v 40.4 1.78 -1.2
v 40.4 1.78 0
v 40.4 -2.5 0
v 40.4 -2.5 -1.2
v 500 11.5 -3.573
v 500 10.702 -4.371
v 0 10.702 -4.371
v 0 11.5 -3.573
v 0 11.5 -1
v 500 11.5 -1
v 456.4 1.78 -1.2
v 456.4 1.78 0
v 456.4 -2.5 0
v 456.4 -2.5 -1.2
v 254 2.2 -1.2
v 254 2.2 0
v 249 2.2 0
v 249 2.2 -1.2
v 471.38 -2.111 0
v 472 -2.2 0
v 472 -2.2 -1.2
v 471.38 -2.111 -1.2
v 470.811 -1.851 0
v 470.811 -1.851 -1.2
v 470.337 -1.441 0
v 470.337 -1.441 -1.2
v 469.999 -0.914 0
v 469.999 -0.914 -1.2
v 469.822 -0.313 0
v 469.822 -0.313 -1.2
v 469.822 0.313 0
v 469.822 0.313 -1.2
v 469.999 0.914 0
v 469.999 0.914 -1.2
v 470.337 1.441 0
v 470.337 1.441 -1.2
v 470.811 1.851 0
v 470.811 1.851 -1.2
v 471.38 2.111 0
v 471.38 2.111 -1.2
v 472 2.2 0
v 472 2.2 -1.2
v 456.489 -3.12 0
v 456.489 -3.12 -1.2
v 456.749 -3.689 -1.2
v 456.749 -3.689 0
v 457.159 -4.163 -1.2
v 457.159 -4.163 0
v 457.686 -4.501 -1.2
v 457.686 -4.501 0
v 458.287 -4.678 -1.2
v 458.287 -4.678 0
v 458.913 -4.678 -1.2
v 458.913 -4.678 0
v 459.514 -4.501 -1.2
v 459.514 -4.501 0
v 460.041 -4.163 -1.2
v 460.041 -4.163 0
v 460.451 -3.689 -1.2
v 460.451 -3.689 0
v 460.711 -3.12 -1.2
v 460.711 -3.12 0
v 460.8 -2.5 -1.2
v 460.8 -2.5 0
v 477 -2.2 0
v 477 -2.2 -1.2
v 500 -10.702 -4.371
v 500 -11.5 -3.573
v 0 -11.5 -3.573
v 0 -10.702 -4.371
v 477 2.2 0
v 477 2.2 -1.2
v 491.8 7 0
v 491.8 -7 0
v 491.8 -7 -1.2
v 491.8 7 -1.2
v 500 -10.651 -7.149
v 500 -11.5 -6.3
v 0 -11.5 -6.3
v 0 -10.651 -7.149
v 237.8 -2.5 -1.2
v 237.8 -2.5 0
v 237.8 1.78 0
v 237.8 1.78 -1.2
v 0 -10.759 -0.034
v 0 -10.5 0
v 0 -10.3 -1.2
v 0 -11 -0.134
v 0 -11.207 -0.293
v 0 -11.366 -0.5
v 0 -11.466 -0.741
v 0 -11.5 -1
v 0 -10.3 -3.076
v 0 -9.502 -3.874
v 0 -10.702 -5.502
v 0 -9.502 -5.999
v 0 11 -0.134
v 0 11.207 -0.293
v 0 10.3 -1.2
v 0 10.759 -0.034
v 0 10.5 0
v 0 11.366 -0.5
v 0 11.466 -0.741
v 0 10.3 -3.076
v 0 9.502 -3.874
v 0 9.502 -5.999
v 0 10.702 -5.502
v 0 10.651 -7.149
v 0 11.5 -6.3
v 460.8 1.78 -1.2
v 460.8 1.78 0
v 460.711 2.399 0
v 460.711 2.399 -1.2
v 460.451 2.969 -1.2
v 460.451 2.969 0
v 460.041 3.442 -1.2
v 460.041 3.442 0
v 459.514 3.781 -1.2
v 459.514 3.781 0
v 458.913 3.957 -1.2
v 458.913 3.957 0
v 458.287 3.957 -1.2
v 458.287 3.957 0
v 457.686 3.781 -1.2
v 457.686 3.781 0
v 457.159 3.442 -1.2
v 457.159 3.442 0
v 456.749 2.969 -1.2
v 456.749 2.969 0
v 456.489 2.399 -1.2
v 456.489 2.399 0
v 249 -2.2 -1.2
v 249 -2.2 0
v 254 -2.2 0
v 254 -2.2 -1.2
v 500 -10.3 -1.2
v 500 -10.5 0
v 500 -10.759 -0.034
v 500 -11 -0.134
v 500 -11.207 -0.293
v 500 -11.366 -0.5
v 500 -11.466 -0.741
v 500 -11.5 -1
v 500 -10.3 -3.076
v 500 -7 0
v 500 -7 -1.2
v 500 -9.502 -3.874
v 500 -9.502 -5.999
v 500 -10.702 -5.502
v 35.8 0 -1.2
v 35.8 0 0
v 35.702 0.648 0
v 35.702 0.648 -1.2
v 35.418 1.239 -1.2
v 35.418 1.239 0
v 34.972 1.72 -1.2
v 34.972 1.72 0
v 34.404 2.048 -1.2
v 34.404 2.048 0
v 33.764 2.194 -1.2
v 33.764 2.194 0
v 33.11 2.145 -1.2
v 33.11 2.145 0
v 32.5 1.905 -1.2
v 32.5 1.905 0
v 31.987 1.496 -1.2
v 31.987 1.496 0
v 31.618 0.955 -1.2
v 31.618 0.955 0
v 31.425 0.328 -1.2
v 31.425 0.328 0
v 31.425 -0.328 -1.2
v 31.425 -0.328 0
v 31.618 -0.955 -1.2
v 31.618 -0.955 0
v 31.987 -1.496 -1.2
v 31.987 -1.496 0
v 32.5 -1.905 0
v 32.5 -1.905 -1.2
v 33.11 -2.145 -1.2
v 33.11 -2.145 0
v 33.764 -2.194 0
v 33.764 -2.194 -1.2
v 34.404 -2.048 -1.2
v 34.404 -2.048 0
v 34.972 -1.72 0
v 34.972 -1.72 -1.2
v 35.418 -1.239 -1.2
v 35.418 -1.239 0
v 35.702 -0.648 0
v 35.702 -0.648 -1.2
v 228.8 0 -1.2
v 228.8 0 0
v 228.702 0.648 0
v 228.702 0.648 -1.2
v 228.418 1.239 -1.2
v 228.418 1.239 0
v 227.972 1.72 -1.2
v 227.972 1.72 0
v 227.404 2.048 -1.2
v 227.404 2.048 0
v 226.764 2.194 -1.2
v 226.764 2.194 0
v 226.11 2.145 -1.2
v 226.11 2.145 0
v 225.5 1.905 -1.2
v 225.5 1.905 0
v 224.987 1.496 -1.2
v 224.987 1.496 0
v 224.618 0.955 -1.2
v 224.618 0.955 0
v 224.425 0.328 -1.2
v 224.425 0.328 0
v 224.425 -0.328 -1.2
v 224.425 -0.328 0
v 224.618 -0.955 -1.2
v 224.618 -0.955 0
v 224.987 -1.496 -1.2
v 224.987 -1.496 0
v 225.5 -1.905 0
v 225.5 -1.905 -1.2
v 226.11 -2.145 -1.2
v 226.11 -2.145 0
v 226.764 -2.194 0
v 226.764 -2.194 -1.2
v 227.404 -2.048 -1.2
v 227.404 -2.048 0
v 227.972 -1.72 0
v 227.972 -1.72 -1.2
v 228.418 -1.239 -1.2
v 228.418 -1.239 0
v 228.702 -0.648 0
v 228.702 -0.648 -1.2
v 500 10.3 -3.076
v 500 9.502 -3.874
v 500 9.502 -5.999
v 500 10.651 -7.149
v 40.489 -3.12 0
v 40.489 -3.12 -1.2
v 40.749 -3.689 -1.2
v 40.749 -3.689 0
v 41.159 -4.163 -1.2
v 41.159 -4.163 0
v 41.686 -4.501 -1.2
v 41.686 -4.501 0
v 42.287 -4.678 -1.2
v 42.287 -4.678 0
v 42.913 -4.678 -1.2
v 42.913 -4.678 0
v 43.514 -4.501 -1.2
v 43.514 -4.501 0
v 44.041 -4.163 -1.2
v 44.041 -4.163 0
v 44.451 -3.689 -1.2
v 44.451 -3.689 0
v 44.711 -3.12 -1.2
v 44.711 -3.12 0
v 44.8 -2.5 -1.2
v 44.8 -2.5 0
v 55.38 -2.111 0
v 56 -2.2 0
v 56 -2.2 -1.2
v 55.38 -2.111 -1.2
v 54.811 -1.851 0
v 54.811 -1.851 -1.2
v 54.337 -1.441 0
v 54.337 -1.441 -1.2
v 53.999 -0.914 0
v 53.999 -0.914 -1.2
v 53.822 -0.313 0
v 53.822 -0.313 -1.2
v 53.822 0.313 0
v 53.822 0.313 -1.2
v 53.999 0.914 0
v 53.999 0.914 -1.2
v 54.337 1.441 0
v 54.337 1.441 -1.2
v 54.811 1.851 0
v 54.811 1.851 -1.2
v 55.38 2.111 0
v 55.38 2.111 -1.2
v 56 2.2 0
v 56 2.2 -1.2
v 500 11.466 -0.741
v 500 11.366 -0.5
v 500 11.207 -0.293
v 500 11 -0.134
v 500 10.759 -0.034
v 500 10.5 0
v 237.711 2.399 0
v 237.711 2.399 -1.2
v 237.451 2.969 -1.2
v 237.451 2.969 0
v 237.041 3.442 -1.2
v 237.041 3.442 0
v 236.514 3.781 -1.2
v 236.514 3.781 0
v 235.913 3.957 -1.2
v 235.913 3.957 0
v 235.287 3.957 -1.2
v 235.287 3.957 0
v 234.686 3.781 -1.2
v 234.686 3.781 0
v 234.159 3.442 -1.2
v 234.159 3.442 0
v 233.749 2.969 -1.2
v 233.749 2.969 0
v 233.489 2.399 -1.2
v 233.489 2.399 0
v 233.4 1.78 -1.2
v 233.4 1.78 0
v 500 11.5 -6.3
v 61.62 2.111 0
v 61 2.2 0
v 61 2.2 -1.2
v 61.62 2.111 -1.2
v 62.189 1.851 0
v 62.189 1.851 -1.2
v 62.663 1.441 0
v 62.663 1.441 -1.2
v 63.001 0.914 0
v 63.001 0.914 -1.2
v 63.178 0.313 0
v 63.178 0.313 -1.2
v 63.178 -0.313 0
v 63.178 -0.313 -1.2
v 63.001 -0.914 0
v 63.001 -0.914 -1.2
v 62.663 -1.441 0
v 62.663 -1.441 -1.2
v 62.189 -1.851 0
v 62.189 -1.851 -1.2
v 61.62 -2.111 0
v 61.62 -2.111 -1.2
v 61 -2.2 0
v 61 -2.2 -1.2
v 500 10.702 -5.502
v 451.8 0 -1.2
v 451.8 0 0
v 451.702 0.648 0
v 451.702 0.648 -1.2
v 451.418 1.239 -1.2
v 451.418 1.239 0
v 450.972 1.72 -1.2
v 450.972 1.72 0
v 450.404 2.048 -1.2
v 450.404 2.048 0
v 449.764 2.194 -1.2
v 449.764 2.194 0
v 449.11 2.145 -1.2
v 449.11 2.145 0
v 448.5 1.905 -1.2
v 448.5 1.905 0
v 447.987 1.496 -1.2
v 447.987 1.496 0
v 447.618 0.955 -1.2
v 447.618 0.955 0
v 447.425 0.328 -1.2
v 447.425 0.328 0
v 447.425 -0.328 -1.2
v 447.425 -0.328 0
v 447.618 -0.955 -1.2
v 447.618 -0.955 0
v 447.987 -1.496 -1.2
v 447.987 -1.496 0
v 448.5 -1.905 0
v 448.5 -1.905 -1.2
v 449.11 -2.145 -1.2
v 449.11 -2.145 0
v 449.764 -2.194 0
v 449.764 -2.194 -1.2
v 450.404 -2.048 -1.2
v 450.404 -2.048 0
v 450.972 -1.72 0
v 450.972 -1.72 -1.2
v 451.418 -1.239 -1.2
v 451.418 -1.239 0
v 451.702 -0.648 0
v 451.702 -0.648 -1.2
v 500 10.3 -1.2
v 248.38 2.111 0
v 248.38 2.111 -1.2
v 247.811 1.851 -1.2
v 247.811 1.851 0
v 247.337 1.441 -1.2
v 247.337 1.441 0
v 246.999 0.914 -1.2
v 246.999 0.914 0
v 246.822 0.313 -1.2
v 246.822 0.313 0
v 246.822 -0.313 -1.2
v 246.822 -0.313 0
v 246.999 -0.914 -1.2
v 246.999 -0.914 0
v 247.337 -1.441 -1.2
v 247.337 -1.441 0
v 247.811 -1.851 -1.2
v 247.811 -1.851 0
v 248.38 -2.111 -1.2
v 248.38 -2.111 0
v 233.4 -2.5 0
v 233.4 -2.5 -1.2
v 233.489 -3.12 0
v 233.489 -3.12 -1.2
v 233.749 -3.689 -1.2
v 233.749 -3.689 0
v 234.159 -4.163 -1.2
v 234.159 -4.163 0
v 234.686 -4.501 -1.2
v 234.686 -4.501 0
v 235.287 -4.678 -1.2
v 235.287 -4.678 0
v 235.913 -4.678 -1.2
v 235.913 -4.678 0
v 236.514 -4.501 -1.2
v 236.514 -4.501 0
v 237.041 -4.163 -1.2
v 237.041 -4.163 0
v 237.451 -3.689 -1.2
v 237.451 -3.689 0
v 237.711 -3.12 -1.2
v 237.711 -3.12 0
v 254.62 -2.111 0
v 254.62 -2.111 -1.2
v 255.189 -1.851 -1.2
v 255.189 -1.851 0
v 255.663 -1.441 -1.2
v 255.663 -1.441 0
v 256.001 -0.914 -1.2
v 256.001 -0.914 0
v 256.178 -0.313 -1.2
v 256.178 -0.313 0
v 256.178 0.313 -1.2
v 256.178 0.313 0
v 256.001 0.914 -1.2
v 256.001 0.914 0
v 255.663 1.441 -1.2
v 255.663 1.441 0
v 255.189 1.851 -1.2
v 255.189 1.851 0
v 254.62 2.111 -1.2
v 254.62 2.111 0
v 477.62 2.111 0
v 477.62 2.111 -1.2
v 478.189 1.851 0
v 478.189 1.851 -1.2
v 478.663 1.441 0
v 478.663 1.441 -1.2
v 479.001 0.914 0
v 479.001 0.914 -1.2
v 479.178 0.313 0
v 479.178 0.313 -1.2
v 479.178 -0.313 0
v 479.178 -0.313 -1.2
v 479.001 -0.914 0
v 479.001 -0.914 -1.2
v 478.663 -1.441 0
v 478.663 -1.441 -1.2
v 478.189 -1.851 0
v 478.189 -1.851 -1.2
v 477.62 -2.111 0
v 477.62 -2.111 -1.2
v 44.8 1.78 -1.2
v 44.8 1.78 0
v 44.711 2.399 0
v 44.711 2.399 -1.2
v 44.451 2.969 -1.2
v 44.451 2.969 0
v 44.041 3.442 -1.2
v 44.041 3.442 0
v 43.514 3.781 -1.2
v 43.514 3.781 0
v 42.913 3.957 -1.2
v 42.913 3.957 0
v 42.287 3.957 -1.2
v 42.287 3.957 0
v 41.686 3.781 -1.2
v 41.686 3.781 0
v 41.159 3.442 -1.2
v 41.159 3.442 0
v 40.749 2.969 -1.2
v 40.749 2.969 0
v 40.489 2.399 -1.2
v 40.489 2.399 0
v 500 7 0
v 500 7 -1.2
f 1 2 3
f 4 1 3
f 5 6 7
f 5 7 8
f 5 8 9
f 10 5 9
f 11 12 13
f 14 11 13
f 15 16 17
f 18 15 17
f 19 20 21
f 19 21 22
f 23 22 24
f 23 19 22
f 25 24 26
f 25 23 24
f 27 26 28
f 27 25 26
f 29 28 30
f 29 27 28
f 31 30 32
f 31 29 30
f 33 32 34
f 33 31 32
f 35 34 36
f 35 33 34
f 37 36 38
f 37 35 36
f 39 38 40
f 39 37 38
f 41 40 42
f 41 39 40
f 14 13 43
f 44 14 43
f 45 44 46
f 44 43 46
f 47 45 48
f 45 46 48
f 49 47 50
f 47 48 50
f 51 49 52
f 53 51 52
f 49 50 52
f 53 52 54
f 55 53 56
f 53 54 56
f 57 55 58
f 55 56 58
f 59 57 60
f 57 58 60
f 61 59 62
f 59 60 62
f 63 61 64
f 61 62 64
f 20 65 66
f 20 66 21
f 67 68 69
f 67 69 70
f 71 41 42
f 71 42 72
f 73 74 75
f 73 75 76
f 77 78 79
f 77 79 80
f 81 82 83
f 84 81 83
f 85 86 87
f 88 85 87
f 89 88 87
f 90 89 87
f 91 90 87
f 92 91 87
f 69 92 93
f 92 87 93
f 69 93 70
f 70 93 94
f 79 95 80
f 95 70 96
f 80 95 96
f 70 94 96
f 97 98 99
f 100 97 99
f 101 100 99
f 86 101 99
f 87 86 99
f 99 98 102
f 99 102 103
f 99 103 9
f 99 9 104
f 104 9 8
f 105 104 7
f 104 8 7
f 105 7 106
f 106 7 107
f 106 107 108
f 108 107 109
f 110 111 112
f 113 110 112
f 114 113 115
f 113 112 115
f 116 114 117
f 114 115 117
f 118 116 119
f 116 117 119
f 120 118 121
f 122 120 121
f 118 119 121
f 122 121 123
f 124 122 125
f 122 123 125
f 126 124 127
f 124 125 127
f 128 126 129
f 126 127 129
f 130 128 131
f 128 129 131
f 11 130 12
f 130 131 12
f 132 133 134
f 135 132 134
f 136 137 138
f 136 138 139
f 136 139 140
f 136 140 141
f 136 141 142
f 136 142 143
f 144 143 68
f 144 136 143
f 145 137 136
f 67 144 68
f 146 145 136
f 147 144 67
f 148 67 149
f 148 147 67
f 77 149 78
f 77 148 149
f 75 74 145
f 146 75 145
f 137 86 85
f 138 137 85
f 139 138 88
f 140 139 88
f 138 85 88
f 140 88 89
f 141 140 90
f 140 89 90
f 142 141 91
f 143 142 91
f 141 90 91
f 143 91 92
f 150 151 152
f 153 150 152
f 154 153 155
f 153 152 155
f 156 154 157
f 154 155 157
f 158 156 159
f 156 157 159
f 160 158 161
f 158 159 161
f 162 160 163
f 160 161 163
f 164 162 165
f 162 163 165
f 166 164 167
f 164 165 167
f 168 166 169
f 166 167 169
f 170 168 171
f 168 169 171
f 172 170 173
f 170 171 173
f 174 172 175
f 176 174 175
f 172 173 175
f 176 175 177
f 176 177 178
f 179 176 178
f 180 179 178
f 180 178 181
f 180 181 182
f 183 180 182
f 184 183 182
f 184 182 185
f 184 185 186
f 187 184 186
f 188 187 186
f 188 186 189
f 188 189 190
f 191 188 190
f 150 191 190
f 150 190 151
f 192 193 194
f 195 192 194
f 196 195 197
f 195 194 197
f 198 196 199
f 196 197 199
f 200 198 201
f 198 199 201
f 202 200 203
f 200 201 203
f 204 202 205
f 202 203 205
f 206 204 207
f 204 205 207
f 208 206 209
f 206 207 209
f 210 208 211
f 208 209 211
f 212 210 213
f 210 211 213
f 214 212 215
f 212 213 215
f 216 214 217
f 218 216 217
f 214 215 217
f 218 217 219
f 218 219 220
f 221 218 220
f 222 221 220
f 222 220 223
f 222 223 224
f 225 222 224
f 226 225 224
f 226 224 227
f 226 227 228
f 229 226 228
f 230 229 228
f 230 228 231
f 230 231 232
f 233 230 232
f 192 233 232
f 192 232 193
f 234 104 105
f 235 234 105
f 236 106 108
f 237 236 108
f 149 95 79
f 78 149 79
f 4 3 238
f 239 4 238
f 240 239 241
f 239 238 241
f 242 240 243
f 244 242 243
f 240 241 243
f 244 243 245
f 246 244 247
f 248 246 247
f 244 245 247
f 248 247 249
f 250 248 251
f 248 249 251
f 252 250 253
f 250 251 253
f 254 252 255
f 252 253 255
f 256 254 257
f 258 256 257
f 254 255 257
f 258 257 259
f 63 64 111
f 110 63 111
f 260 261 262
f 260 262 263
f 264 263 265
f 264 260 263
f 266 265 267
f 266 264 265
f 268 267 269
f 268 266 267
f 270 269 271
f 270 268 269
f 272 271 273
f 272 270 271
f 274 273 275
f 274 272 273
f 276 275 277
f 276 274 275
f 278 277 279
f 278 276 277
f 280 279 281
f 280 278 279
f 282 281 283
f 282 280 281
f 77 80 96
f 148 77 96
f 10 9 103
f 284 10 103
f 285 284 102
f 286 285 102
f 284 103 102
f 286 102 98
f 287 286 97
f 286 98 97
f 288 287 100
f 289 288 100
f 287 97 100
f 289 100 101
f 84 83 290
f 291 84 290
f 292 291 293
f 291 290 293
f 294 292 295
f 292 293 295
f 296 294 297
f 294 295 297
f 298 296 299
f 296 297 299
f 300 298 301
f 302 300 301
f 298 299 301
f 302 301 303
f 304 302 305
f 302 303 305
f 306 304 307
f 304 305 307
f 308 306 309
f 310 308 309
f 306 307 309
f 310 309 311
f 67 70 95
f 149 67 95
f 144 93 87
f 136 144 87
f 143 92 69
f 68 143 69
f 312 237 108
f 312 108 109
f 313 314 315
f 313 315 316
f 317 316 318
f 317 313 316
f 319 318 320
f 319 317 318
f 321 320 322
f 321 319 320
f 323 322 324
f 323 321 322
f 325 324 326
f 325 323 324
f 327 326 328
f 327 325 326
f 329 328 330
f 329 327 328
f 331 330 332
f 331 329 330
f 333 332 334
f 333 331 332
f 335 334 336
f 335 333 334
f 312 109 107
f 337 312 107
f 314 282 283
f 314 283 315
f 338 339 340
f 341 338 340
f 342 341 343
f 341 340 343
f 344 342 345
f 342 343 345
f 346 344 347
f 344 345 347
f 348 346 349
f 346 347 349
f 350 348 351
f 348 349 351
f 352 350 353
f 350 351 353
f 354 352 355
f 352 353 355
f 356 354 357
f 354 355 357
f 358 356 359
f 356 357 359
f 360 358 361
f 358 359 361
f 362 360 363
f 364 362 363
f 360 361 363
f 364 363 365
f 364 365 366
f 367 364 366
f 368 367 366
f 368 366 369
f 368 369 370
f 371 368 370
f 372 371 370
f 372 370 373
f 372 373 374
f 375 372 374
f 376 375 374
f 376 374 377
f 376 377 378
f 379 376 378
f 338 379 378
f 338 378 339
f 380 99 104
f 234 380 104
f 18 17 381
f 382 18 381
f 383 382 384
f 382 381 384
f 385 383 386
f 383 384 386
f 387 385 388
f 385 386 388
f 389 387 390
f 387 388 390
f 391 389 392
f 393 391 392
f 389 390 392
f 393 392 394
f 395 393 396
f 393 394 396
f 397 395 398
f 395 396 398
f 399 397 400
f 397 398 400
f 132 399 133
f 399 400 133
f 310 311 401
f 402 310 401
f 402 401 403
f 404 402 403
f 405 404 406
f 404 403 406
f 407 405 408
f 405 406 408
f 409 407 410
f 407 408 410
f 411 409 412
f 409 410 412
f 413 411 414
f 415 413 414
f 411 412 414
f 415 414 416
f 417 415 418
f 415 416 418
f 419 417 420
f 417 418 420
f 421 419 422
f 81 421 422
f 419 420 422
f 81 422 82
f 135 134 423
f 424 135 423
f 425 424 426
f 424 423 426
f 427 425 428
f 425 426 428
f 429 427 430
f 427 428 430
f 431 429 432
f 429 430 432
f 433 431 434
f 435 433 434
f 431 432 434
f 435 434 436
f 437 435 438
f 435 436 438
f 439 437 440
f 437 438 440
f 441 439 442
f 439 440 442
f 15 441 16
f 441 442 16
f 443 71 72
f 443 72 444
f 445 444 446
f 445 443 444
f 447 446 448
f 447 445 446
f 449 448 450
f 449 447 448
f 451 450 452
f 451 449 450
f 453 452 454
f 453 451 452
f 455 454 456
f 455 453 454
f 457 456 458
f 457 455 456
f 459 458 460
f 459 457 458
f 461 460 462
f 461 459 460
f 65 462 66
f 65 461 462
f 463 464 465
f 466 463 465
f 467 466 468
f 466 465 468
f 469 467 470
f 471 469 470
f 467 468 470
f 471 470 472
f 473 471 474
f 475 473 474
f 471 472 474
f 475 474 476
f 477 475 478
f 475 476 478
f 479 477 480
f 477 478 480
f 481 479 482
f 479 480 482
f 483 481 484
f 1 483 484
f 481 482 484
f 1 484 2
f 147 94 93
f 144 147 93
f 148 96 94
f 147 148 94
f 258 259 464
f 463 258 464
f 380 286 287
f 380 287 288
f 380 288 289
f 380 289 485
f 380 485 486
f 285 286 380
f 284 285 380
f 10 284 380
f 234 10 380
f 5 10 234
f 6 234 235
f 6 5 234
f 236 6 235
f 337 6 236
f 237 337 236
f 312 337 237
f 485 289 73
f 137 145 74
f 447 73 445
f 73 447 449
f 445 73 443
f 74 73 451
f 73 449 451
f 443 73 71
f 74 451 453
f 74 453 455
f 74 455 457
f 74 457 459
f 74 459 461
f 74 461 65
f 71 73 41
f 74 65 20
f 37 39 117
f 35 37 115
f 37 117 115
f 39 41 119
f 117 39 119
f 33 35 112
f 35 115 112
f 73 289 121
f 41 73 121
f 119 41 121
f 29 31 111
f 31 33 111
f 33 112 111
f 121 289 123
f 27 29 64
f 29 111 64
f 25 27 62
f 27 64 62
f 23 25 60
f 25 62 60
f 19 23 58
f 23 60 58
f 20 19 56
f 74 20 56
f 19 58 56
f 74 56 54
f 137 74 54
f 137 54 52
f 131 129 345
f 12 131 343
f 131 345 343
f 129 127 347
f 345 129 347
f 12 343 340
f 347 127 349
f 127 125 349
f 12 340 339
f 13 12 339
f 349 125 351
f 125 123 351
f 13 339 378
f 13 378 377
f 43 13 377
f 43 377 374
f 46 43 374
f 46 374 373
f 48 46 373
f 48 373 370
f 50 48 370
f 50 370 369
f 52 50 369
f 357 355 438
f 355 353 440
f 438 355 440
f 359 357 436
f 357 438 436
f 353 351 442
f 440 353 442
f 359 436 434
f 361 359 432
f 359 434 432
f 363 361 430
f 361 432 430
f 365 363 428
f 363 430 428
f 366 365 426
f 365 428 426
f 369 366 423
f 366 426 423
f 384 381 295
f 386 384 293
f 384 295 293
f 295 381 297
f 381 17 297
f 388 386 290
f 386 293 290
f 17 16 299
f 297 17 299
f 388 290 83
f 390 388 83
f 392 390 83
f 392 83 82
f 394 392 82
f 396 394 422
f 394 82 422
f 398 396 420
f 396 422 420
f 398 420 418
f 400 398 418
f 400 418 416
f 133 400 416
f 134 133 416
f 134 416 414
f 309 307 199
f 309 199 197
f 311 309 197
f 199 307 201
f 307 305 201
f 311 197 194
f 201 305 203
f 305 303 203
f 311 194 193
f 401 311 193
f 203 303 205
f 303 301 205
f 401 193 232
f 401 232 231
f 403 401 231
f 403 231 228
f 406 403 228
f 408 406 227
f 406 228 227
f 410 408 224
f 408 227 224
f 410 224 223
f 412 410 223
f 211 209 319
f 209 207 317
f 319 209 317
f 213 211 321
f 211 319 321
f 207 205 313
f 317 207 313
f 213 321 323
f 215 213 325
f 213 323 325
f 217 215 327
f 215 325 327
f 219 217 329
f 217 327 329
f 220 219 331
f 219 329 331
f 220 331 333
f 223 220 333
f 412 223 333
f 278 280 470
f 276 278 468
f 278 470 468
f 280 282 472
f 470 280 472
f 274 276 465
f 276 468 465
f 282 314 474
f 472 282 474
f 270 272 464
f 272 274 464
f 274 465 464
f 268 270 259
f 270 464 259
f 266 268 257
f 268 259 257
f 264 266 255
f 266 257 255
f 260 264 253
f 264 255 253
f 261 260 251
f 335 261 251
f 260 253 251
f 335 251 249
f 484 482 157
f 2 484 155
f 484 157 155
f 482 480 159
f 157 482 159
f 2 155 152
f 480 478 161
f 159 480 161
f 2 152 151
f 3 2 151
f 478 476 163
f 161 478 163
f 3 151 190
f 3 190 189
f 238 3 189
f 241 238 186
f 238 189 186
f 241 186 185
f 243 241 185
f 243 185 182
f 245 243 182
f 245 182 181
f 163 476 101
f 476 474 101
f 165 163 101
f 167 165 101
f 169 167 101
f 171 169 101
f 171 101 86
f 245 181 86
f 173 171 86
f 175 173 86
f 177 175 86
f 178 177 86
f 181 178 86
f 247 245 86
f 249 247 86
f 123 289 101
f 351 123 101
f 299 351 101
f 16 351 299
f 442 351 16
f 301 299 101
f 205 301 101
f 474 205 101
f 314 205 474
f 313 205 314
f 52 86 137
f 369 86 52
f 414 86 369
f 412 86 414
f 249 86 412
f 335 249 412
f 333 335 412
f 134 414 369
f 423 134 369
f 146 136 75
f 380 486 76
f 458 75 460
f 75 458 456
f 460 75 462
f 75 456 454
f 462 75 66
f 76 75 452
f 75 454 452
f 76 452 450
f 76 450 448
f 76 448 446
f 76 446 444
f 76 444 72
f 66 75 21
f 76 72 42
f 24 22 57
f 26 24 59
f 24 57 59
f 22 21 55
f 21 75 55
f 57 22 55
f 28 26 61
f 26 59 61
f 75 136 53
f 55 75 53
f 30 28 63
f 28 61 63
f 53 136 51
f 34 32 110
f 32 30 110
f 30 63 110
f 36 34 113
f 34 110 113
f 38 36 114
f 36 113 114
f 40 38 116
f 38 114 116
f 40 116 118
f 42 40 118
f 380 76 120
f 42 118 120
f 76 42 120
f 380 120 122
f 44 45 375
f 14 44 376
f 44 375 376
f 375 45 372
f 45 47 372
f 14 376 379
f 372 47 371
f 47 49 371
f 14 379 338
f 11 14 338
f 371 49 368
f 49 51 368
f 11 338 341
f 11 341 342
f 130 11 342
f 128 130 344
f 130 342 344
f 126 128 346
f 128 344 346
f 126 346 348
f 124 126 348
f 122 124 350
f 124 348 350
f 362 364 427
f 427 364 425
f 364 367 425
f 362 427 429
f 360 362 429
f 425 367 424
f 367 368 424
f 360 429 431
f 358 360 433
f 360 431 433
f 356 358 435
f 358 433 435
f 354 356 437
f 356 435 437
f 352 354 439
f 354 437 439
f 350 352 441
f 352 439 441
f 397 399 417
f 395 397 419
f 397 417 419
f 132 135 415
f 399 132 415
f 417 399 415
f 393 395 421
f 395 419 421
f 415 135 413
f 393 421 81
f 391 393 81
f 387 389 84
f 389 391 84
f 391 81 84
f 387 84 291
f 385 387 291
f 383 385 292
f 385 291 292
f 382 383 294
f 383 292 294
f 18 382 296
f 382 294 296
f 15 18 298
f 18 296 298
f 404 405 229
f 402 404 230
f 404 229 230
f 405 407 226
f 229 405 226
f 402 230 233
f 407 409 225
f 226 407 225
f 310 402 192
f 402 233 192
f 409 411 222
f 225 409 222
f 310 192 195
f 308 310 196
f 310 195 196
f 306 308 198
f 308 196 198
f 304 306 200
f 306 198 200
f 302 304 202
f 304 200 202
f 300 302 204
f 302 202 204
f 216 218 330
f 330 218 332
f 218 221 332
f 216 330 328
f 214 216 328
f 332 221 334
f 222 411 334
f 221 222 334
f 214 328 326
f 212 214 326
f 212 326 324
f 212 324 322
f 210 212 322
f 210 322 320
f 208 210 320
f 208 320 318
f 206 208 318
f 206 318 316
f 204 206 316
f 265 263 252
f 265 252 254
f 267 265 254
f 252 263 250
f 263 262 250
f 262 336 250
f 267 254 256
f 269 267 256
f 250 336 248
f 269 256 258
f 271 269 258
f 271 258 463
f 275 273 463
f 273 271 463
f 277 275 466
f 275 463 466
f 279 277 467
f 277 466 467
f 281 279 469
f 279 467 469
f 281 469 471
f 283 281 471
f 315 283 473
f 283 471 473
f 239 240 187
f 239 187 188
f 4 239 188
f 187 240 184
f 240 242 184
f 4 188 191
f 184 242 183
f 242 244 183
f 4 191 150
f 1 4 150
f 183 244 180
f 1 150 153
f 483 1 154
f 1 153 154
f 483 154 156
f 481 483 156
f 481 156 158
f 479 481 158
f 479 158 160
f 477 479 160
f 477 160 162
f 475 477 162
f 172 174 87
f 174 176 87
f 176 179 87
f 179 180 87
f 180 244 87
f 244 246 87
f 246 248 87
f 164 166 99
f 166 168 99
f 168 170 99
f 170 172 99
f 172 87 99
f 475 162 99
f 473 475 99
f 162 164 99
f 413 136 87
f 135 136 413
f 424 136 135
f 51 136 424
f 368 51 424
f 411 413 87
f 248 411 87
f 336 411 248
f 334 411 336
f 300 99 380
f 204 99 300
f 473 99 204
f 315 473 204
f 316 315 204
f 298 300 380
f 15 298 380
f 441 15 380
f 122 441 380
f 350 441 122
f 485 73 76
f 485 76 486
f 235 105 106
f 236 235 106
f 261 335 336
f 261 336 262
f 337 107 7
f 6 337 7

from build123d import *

# Parameters (mm, degrees)
EXTRUDE_3_DEPTH     = 500
SKETCH_2_R          = 2.2
SKETCH_2_W          = 8.2
SKETCH_2_H          = 14
CUT_EXTRUDE_1_DEPTH = 8.148528137


with BuildPart() as part:
    # Эскиз1 → Вытянуть-Тонкостенный3 (new body)
    with BuildSketch(Plane(origin=(0, 0, 0), x_dir=(0, 0, -1), z_dir=(1, 0, 0))):
        with BuildLine():
            Line((6.3, 11.5), (5.501920783, 10.701920783))
            Line((5.501920783, 10.701920783), (4.371381229, 10.701920783))
            Line((4.371381229, 10.701920783), (3.573302011, 11.5))
            Line((3.573302011, 11.5), (1, 11.5))
            ThreePointArc((1, 11.5), (0.292893219, 11.207106781), (0, 10.5))
            Line((0, 10.5), (0, -10.5))
            ThreePointArc((0, -10.5), (0.292893219, -11.207106781), (1, -11.5))
            Line((1, -11.5), (3.573302011, -11.5))
            Line((3.573302011, -11.5), (4.371381229, -10.701920783))
            Line((4.371381229, -10.701920783), (5.501920783, -10.701920783))
            Line((5.501920783, -10.701920783), (6.3, -11.5))
            Line((6.3, -11.5), (7.148528137, -10.651471863))
            Line((7.148528137, -10.651471863), (5.998977057, -9.501920783))
            Line((5.998977057, -9.501920783), (3.874324954, -9.501920783))
            Line((3.874324954, -9.501920783), (3.076245737, -10.3))
            Line((3.076245737, -10.3), (1.2, -10.3))
            Line((1.2, -10.3), (1.2, 10.3))
            Line((1.2, 10.3), (3.076245737, 10.3))
            Line((3.076245737, 10.3), (3.874324954, 9.501920783))
            Line((3.874324954, 9.501920783), (5.998977057, 9.501920783))
            Line((5.998977057, 9.501920783), (7.148528137, 10.651471863))
            Line((7.148528137, 10.651471863), (6.3, 11.5))
        make_face()
    extrude(amount=EXTRUDE_3_DEPTH)

    # Эскиз2 → Вырез-Вытянуть1 (cut, through all)
    with BuildSketch(Plane.XY):
        with Locations((449.6, 0)):
            Circle(SKETCH_2_R)
        with Locations((226.6, 0)):
            Circle(SKETCH_2_R)
        with Locations((33.6, 0)):
            Circle(SKETCH_2_R)
        with Locations((495.9, 0)):
            Rectangle(SKETCH_2_W, SKETCH_2_H)
        with BuildLine():
            Line((472, 2.2), (477, 2.2))
            ThreePointArc((477, 2.2), (479.2, 0), (477, -2.2))
            Line((477, -2.2), (472, -2.2))
            ThreePointArc((472, -2.2), (469.8, 0), (472, 2.2))
        make_face()
        with BuildLine():
            Line((456.4, 1.779598361), (456.4, -2.5))
            ThreePointArc((456.4, -2.5), (458.6, -4.7), (460.8, -2.5))
            Line((460.8, -2.5), (460.8, 1.779598361))
            ThreePointArc((460.8, 1.779598361), (458.6, 3.979598361), (456.4, 1.779598361))
        make_face()
        with BuildLine():
            Line((233.4, 1.779598361), (233.4, -2.5))
            ThreePointArc((233.4, -2.5), (235.6, -4.7), (237.8, -2.5))
            Line((237.8, -2.5), (237.8, 1.779598361))
            ThreePointArc((237.8, 1.779598361), (235.6, 3.979598361), (233.4, 1.779598361))
        make_face()
        with BuildLine():
            Line((249, -2.2), (254, -2.2))
            ThreePointArc((254, -2.2), (256.2, 0), (254, 2.2))
            Line((254, 2.2), (249, 2.2))
            ThreePointArc((249, 2.2), (246.8, 0), (249, -2.2))
        make_face()
        with BuildLine():
            Line((44.8, -2.5), (44.8, 1.779598361))
            ThreePointArc((44.8, 1.779598361), (42.6, 3.979598361), (40.4, 1.779598361))
            Line((40.4, 1.779598361), (40.4, -2.5))
            ThreePointArc((40.4, -2.5), (42.6, -4.7), (44.8, -2.5))
        make_face()
        with BuildLine():
            Line((56, 2.2), (61, 2.2))
            ThreePointArc((61, 2.2), (63.2, 0), (61, -2.2))
            Line((61, -2.2), (56, -2.2))
            ThreePointArc((56, -2.2), (53.8, 0), (56, 2.2))
        make_face()
    extrude(amount=-CUT_EXTRUDE_1_DEPTH, mode=Mode.SUBTRACT)


solid = part.part
